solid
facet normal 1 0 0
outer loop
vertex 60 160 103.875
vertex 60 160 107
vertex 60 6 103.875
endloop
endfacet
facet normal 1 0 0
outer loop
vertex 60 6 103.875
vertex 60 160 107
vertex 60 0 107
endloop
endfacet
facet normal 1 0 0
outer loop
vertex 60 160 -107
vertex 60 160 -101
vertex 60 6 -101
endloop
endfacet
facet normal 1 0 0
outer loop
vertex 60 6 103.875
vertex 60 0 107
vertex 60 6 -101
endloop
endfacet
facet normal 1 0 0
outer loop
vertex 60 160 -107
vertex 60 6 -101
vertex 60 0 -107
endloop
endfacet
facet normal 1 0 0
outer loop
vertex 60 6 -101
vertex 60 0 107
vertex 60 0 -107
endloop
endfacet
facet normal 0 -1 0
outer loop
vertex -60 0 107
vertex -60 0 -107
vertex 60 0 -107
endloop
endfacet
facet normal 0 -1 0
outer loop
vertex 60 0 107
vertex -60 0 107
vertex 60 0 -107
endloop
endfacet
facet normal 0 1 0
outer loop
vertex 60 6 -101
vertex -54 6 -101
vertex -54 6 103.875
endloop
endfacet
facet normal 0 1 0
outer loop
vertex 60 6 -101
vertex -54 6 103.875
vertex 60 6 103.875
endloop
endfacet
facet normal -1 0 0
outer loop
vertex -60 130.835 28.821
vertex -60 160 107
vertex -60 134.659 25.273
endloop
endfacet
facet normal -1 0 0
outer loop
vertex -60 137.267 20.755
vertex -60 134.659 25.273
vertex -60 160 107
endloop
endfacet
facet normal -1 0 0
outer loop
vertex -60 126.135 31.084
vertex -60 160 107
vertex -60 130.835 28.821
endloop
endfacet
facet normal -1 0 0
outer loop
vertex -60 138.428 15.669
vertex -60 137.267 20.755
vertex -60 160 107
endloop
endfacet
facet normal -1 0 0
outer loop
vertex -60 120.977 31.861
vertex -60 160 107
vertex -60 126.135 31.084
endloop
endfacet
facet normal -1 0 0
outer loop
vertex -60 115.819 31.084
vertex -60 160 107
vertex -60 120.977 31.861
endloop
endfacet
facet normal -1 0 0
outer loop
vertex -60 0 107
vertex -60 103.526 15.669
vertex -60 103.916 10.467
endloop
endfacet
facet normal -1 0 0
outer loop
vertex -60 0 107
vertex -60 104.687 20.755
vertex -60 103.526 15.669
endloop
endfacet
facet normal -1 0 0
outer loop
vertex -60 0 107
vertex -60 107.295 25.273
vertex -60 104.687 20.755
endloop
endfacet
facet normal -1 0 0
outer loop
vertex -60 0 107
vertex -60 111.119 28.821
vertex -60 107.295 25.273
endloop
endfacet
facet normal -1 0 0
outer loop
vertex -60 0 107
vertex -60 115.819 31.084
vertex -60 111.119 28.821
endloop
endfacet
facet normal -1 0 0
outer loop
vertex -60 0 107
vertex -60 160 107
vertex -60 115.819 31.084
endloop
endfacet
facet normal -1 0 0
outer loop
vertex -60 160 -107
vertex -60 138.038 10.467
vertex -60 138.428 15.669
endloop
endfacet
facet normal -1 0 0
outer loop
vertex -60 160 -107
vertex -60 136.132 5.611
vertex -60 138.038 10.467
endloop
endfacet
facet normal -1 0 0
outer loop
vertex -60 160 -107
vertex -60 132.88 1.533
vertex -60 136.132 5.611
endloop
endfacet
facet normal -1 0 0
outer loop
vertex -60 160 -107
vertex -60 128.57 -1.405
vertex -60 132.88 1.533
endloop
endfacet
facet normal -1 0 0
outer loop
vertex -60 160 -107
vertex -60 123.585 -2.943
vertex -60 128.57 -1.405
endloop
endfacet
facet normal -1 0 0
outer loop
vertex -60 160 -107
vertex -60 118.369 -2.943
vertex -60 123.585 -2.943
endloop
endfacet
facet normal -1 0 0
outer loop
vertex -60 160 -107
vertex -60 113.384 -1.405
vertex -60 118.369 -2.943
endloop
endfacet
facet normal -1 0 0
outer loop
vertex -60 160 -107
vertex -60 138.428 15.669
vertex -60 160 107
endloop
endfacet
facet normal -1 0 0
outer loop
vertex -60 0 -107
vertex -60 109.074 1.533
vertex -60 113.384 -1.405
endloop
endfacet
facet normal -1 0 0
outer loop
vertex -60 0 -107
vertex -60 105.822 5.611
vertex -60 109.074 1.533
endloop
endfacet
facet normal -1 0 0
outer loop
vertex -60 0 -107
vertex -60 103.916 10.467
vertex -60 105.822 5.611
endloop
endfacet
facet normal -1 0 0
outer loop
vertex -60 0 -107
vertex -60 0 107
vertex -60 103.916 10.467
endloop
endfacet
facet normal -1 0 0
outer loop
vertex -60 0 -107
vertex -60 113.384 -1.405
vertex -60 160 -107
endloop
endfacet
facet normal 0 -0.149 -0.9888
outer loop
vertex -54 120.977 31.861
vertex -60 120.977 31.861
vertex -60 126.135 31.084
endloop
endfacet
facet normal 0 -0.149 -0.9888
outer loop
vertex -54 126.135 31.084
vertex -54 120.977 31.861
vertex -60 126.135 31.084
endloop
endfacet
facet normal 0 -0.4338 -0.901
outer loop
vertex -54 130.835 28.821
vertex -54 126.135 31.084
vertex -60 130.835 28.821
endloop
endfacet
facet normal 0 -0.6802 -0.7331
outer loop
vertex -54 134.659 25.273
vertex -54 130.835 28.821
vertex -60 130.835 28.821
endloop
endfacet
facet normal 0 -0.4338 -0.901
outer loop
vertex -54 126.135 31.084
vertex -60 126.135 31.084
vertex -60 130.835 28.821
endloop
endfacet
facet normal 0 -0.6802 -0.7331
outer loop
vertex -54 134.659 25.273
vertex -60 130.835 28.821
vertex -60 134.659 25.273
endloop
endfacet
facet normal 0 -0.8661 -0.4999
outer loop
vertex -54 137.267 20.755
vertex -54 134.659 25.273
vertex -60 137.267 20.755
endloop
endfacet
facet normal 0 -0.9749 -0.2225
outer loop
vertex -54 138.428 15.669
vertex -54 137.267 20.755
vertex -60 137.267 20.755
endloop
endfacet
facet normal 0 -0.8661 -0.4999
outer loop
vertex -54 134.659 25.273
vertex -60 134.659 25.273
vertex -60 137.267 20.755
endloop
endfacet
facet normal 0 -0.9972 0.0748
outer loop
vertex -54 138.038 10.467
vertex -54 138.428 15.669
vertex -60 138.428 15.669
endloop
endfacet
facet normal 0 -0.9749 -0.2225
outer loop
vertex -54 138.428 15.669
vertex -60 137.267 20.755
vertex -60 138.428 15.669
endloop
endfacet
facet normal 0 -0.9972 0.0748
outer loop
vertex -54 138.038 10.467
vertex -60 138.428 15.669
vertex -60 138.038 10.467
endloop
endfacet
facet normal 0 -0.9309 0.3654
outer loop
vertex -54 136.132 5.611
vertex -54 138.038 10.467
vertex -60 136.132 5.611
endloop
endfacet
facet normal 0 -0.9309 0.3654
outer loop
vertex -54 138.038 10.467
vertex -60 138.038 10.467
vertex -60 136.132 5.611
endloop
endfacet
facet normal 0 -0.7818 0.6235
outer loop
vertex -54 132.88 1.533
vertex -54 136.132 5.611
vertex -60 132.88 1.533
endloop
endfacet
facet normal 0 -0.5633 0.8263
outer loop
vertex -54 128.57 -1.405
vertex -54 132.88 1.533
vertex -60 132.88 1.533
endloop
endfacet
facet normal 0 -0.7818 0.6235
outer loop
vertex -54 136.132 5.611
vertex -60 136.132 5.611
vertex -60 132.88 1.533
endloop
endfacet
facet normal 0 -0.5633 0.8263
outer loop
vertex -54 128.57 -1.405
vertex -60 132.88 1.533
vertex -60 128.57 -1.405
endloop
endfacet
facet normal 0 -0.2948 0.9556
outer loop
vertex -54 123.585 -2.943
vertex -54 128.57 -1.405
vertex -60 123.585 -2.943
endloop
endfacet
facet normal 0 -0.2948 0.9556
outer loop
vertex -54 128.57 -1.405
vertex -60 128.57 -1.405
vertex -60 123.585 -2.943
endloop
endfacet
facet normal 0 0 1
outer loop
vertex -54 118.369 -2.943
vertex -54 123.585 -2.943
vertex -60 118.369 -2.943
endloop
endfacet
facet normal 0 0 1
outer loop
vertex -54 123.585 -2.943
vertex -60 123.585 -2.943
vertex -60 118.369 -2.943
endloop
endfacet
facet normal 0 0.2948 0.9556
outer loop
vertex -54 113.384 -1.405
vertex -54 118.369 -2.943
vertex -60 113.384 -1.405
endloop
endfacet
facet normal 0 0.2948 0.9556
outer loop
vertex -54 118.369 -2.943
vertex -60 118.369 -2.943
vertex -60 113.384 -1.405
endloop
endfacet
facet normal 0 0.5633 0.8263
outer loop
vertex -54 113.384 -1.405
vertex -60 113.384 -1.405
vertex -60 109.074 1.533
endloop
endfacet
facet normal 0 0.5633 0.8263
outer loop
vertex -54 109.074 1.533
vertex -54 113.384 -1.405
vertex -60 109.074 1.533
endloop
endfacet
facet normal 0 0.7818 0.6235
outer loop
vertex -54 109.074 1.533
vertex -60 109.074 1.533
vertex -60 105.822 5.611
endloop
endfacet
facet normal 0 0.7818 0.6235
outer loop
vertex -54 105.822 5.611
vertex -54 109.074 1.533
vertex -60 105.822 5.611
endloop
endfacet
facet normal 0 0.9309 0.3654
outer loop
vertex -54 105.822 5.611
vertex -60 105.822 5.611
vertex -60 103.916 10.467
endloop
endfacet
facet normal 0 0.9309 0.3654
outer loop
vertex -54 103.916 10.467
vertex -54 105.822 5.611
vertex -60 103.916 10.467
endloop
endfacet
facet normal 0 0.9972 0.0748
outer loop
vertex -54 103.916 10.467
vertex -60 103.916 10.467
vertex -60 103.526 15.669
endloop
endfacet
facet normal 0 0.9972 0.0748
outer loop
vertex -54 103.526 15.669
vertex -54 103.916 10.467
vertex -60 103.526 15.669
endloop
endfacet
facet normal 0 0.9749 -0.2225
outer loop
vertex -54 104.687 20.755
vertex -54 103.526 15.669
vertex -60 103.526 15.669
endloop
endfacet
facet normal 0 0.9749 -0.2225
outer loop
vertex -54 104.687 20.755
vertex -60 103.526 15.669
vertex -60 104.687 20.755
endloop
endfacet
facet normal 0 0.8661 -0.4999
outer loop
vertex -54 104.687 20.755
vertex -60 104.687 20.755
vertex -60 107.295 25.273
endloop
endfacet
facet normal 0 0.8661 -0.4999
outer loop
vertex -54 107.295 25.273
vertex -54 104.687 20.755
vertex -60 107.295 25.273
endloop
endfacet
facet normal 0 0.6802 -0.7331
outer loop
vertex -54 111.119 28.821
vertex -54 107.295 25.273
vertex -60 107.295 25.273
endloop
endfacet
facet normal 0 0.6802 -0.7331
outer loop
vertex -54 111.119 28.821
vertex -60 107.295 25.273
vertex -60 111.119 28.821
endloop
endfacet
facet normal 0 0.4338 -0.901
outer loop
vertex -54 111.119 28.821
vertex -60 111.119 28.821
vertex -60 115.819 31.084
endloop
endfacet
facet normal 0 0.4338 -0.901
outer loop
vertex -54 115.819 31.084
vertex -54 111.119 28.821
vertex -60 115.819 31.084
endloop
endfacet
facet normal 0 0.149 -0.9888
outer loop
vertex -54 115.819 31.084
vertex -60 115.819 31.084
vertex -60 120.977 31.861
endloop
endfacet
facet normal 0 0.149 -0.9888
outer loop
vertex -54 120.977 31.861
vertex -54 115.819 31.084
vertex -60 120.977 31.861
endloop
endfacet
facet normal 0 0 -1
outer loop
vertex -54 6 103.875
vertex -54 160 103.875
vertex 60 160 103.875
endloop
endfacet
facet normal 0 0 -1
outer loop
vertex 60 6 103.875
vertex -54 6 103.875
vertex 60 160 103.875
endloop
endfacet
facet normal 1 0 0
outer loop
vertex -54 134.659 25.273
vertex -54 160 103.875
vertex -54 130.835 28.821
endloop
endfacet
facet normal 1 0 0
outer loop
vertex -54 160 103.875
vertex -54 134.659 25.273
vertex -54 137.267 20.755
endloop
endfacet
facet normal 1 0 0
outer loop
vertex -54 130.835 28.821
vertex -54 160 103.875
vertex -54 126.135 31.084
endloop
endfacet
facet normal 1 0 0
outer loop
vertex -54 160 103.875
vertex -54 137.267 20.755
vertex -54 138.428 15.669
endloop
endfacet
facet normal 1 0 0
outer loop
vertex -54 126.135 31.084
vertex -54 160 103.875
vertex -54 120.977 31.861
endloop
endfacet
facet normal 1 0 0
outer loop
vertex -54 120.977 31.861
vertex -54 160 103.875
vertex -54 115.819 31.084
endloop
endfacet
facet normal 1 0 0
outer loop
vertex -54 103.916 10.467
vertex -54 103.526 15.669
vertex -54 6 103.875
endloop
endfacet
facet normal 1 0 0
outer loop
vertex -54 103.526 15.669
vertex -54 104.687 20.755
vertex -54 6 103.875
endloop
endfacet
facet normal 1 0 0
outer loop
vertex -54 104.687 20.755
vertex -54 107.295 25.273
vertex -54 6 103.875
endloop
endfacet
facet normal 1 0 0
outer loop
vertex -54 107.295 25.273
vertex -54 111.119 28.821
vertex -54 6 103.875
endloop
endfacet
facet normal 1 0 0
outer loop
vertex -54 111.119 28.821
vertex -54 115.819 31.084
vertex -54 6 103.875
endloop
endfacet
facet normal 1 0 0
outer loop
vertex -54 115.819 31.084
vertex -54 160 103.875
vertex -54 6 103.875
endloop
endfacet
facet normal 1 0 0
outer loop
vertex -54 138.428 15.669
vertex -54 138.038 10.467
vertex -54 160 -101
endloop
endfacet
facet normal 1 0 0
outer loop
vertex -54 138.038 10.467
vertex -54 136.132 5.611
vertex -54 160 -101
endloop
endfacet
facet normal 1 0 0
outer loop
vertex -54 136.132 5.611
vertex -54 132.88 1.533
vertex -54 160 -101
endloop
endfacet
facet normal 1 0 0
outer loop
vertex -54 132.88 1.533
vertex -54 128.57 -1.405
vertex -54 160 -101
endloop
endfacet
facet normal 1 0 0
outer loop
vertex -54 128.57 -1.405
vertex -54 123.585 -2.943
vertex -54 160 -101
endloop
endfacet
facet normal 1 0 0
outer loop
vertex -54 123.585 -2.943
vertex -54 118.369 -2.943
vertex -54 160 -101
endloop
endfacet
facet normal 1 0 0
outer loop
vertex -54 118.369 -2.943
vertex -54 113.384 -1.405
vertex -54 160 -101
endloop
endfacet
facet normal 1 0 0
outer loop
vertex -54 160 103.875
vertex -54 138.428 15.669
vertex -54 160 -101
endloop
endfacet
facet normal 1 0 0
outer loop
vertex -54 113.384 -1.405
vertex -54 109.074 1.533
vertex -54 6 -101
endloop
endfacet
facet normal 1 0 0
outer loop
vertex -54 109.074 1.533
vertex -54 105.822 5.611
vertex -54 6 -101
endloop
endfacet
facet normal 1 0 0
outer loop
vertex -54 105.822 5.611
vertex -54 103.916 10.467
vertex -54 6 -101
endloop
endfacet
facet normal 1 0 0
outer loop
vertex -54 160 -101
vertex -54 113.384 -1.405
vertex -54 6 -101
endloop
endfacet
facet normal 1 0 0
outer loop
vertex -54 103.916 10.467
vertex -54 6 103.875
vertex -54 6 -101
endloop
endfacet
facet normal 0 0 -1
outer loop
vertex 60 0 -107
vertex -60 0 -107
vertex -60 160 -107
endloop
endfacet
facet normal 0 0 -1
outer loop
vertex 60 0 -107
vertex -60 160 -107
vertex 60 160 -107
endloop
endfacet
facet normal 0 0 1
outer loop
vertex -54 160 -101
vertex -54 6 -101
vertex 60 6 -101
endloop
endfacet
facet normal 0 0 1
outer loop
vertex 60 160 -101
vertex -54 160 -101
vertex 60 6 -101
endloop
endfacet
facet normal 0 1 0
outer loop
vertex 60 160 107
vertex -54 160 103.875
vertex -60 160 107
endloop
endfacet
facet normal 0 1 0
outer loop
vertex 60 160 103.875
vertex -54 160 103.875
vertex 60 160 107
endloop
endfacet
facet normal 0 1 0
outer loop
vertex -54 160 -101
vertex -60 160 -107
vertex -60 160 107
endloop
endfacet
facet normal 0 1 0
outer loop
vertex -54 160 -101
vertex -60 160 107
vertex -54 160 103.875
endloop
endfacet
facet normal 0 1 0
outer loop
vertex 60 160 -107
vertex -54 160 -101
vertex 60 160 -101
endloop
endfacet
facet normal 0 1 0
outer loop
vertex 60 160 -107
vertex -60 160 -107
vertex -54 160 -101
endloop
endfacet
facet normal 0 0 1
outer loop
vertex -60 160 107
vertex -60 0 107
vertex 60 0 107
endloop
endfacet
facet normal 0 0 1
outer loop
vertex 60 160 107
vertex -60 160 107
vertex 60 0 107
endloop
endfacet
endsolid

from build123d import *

# Parameters (mm, degrees)
SKETCH1_W                 = 120
SKETCH1_H                 = 214
BOSS_EXTRUDE1_DEPTH       = 160
SHELL1_T                  = -6
SHELL1_THICKNESS_3_FACE_W = 114
SHELL1_THICKNESS_3_FACE_H = 154
SHELL1_THICKNESS_3_DEPTH  = 2.875
CUT_EXTRUDE1_REACH        = 228.824
SKETCH4_R                 = 17.5


with BuildPart() as part:
    # Sketch1 → Boss-Extrude1 (new body)
    with BuildSketch(Plane(origin=(0, 0, 0), x_dir=(1, 0, 0), z_dir=(0, 1, 0))):
        Rectangle(SKETCH1_W, SKETCH1_H)
    extrude(amount=BOSS_EXTRUDE1_DEPTH)

    # Shell1
    shell1_openings = [part.faces().sort_by_distance(p)[0] for p in [
        (0, 160, 0),
        (60, 80, 0),
    ]]
    offset(amount=SHELL1_T, openings=shell1_openings, kind=Kind.INTERSECTION)

    # Shell1 thickness 3 face (on inner face of the shell) → Shell1 thickness 3 (cut)
    with BuildSketch(Plane(origin=(3, 83, 101), x_dir=(1, 0, 0), z_dir=(0, 0, 1))):
        Rectangle(SHELL1_THICKNESS_3_FACE_W, SHELL1_THICKNESS_3_FACE_H)
    extrude(amount=SHELL1_THICKNESS_3_DEPTH, mode=Mode.SUBTRACT)

    # Sketch4 → Cut-Extrude1 (cut, up to next)
    with BuildSketch(Plane.ZY.offset(60), mode=Mode.PRIVATE) as cut_extrude1_sk1:
        with Locations((14.361495045, 120.976954776)):
            Circle(SKETCH4_R)
    cut_extrude1_tool1 = extrude(cut_extrude1_sk1.sketch, amount=-CUT_EXTRUDE1_REACH, mode=Mode.PRIVATE) & part.part
    add(cut_extrude1_tool1.solids().sort_by_distance((-60, 120.976955, 14.361495))[0], mode=Mode.SUBTRACT)


solid = part.part
